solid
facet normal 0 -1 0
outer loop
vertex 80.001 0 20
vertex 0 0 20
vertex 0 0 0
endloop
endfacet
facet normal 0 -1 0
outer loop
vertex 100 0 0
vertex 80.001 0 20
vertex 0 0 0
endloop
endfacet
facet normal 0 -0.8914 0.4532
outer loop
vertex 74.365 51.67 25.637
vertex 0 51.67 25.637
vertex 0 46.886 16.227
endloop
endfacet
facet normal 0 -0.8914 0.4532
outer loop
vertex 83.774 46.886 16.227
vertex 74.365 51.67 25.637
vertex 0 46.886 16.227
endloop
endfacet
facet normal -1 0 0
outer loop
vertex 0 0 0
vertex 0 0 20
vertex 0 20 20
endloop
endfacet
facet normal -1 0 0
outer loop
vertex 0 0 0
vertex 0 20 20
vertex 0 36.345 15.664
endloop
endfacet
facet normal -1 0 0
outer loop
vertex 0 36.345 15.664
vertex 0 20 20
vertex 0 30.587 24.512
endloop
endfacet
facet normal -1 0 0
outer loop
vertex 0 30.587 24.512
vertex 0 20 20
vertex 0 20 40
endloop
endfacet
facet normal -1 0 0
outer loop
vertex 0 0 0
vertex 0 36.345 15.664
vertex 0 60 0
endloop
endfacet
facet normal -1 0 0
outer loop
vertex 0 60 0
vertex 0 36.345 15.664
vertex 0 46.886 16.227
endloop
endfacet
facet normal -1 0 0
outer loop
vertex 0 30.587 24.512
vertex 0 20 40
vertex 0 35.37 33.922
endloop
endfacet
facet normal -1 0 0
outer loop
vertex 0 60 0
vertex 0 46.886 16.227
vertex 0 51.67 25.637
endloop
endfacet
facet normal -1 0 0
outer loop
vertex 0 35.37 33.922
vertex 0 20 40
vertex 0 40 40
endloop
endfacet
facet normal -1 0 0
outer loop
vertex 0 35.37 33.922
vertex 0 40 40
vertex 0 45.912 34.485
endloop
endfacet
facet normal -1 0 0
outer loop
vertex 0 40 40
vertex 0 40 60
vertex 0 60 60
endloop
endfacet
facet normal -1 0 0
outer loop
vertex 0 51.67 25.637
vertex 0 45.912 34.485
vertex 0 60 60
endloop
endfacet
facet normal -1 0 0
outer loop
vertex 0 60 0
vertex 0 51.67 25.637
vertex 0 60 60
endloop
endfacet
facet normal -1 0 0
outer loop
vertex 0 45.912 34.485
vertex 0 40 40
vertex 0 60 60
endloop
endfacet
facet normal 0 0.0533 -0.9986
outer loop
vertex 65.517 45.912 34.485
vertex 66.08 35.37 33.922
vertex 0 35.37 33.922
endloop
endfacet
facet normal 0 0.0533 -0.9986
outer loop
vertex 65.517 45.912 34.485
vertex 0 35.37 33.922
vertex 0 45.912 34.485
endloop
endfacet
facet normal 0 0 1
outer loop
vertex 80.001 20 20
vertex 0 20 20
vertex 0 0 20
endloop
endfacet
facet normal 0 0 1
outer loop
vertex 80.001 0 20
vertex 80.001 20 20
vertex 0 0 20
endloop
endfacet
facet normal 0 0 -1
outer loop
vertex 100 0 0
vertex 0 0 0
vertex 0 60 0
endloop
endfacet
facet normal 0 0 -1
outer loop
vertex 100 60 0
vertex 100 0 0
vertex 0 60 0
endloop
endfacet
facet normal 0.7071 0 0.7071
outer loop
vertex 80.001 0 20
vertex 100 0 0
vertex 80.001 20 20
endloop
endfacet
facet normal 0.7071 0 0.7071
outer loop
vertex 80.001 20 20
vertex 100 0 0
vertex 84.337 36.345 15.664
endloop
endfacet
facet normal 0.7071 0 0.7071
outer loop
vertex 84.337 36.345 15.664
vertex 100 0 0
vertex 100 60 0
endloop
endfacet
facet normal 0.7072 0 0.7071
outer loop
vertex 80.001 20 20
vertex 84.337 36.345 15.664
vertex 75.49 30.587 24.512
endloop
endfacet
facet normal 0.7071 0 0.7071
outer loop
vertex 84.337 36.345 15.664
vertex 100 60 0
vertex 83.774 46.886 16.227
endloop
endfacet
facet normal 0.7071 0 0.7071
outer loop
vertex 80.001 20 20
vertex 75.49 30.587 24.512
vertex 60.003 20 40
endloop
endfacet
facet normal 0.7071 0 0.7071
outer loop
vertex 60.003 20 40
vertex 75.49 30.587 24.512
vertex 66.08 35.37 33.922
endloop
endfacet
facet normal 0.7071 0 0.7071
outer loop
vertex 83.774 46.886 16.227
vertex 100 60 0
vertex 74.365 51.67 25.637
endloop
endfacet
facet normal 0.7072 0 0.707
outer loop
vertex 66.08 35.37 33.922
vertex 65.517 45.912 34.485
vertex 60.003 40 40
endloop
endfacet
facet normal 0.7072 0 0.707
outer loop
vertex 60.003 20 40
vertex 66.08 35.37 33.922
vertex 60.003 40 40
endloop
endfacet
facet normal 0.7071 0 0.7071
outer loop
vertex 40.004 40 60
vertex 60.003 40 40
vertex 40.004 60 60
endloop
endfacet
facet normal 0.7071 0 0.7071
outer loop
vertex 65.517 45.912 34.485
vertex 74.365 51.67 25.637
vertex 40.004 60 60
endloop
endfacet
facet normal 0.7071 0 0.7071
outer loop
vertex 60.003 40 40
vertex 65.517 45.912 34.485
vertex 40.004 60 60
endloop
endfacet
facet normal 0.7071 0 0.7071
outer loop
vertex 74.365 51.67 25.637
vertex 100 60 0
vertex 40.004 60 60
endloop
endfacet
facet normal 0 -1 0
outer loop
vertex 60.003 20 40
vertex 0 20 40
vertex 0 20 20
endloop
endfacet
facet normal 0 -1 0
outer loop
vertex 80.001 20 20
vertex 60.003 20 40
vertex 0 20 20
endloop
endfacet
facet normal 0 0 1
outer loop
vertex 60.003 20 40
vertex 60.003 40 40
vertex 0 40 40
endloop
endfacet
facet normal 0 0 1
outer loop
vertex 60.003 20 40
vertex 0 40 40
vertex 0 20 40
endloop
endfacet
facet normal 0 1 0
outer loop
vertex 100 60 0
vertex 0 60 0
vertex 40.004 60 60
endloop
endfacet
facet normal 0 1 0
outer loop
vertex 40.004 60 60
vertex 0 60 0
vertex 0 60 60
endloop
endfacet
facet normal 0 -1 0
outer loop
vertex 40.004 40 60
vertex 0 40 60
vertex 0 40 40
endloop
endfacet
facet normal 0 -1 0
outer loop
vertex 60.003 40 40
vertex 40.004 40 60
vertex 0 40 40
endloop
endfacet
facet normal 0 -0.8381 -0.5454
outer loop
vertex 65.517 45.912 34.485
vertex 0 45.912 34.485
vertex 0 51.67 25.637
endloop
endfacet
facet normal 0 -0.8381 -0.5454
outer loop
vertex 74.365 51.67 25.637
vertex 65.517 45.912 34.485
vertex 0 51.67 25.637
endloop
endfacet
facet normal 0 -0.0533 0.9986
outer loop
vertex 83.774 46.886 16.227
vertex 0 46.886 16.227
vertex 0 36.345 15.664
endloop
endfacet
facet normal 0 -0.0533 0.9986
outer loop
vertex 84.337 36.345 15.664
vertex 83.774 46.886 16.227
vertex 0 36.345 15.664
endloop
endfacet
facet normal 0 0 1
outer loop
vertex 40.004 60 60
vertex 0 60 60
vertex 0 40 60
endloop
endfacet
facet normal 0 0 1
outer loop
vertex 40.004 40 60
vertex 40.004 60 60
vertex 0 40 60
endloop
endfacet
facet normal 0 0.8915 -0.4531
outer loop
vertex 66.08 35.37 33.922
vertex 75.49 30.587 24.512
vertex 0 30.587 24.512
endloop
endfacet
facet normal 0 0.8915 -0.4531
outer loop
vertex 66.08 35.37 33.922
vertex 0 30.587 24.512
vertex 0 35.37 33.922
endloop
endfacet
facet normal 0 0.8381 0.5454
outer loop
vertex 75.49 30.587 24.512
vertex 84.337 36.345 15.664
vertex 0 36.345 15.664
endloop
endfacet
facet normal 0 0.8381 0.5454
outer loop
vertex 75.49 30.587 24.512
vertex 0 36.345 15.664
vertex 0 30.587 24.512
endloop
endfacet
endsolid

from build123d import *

# Parameters (mm, degrees)
F1_DEPTH = 100
F3_DEPTH = 60.001
F5_DEPTH = 100.001


with BuildPart() as f1:
    # F0 (on Right) → F1 (new body)
    with BuildSketch(Plane.YZ):
        Polygon((0, 20), (0, 0), (60, 0), (60, 60), (40, 60), (40, 40), (20, 40), (20, 20), align=None)
    extrude(amount=F1_DEPTH)

    # F2 (on face) → F3 (cut, through all)
    with BuildSketch(Plane(origin=(0, 60, 0), x_dir=(-1, 0, 0), z_dir=(0, 1, 0))):
        Polygon((-100, 60), (-100, 0), (-40.003979, 60), align=None)
    extrude(amount=-F3_DEPTH, mode=Mode.SUBTRACT)

    # F4 (on face) → F5 (cut, through all)
    with BuildSketch(Plane(origin=(0, 0, 0), x_dir=(0, -1, 0), z_dir=(-1, 0, 0))):
        Polygon((-30.586883, 24.511646), (-35.370231, 33.922151), (-45.91164, 34.484902), (-51.669702, 25.63715), (-46.886355, 16.226646), (-36.344945, 15.663894), align=None)
    extrude(amount=-F5_DEPTH, mode=Mode.SUBTRACT)


solid = f1.part
